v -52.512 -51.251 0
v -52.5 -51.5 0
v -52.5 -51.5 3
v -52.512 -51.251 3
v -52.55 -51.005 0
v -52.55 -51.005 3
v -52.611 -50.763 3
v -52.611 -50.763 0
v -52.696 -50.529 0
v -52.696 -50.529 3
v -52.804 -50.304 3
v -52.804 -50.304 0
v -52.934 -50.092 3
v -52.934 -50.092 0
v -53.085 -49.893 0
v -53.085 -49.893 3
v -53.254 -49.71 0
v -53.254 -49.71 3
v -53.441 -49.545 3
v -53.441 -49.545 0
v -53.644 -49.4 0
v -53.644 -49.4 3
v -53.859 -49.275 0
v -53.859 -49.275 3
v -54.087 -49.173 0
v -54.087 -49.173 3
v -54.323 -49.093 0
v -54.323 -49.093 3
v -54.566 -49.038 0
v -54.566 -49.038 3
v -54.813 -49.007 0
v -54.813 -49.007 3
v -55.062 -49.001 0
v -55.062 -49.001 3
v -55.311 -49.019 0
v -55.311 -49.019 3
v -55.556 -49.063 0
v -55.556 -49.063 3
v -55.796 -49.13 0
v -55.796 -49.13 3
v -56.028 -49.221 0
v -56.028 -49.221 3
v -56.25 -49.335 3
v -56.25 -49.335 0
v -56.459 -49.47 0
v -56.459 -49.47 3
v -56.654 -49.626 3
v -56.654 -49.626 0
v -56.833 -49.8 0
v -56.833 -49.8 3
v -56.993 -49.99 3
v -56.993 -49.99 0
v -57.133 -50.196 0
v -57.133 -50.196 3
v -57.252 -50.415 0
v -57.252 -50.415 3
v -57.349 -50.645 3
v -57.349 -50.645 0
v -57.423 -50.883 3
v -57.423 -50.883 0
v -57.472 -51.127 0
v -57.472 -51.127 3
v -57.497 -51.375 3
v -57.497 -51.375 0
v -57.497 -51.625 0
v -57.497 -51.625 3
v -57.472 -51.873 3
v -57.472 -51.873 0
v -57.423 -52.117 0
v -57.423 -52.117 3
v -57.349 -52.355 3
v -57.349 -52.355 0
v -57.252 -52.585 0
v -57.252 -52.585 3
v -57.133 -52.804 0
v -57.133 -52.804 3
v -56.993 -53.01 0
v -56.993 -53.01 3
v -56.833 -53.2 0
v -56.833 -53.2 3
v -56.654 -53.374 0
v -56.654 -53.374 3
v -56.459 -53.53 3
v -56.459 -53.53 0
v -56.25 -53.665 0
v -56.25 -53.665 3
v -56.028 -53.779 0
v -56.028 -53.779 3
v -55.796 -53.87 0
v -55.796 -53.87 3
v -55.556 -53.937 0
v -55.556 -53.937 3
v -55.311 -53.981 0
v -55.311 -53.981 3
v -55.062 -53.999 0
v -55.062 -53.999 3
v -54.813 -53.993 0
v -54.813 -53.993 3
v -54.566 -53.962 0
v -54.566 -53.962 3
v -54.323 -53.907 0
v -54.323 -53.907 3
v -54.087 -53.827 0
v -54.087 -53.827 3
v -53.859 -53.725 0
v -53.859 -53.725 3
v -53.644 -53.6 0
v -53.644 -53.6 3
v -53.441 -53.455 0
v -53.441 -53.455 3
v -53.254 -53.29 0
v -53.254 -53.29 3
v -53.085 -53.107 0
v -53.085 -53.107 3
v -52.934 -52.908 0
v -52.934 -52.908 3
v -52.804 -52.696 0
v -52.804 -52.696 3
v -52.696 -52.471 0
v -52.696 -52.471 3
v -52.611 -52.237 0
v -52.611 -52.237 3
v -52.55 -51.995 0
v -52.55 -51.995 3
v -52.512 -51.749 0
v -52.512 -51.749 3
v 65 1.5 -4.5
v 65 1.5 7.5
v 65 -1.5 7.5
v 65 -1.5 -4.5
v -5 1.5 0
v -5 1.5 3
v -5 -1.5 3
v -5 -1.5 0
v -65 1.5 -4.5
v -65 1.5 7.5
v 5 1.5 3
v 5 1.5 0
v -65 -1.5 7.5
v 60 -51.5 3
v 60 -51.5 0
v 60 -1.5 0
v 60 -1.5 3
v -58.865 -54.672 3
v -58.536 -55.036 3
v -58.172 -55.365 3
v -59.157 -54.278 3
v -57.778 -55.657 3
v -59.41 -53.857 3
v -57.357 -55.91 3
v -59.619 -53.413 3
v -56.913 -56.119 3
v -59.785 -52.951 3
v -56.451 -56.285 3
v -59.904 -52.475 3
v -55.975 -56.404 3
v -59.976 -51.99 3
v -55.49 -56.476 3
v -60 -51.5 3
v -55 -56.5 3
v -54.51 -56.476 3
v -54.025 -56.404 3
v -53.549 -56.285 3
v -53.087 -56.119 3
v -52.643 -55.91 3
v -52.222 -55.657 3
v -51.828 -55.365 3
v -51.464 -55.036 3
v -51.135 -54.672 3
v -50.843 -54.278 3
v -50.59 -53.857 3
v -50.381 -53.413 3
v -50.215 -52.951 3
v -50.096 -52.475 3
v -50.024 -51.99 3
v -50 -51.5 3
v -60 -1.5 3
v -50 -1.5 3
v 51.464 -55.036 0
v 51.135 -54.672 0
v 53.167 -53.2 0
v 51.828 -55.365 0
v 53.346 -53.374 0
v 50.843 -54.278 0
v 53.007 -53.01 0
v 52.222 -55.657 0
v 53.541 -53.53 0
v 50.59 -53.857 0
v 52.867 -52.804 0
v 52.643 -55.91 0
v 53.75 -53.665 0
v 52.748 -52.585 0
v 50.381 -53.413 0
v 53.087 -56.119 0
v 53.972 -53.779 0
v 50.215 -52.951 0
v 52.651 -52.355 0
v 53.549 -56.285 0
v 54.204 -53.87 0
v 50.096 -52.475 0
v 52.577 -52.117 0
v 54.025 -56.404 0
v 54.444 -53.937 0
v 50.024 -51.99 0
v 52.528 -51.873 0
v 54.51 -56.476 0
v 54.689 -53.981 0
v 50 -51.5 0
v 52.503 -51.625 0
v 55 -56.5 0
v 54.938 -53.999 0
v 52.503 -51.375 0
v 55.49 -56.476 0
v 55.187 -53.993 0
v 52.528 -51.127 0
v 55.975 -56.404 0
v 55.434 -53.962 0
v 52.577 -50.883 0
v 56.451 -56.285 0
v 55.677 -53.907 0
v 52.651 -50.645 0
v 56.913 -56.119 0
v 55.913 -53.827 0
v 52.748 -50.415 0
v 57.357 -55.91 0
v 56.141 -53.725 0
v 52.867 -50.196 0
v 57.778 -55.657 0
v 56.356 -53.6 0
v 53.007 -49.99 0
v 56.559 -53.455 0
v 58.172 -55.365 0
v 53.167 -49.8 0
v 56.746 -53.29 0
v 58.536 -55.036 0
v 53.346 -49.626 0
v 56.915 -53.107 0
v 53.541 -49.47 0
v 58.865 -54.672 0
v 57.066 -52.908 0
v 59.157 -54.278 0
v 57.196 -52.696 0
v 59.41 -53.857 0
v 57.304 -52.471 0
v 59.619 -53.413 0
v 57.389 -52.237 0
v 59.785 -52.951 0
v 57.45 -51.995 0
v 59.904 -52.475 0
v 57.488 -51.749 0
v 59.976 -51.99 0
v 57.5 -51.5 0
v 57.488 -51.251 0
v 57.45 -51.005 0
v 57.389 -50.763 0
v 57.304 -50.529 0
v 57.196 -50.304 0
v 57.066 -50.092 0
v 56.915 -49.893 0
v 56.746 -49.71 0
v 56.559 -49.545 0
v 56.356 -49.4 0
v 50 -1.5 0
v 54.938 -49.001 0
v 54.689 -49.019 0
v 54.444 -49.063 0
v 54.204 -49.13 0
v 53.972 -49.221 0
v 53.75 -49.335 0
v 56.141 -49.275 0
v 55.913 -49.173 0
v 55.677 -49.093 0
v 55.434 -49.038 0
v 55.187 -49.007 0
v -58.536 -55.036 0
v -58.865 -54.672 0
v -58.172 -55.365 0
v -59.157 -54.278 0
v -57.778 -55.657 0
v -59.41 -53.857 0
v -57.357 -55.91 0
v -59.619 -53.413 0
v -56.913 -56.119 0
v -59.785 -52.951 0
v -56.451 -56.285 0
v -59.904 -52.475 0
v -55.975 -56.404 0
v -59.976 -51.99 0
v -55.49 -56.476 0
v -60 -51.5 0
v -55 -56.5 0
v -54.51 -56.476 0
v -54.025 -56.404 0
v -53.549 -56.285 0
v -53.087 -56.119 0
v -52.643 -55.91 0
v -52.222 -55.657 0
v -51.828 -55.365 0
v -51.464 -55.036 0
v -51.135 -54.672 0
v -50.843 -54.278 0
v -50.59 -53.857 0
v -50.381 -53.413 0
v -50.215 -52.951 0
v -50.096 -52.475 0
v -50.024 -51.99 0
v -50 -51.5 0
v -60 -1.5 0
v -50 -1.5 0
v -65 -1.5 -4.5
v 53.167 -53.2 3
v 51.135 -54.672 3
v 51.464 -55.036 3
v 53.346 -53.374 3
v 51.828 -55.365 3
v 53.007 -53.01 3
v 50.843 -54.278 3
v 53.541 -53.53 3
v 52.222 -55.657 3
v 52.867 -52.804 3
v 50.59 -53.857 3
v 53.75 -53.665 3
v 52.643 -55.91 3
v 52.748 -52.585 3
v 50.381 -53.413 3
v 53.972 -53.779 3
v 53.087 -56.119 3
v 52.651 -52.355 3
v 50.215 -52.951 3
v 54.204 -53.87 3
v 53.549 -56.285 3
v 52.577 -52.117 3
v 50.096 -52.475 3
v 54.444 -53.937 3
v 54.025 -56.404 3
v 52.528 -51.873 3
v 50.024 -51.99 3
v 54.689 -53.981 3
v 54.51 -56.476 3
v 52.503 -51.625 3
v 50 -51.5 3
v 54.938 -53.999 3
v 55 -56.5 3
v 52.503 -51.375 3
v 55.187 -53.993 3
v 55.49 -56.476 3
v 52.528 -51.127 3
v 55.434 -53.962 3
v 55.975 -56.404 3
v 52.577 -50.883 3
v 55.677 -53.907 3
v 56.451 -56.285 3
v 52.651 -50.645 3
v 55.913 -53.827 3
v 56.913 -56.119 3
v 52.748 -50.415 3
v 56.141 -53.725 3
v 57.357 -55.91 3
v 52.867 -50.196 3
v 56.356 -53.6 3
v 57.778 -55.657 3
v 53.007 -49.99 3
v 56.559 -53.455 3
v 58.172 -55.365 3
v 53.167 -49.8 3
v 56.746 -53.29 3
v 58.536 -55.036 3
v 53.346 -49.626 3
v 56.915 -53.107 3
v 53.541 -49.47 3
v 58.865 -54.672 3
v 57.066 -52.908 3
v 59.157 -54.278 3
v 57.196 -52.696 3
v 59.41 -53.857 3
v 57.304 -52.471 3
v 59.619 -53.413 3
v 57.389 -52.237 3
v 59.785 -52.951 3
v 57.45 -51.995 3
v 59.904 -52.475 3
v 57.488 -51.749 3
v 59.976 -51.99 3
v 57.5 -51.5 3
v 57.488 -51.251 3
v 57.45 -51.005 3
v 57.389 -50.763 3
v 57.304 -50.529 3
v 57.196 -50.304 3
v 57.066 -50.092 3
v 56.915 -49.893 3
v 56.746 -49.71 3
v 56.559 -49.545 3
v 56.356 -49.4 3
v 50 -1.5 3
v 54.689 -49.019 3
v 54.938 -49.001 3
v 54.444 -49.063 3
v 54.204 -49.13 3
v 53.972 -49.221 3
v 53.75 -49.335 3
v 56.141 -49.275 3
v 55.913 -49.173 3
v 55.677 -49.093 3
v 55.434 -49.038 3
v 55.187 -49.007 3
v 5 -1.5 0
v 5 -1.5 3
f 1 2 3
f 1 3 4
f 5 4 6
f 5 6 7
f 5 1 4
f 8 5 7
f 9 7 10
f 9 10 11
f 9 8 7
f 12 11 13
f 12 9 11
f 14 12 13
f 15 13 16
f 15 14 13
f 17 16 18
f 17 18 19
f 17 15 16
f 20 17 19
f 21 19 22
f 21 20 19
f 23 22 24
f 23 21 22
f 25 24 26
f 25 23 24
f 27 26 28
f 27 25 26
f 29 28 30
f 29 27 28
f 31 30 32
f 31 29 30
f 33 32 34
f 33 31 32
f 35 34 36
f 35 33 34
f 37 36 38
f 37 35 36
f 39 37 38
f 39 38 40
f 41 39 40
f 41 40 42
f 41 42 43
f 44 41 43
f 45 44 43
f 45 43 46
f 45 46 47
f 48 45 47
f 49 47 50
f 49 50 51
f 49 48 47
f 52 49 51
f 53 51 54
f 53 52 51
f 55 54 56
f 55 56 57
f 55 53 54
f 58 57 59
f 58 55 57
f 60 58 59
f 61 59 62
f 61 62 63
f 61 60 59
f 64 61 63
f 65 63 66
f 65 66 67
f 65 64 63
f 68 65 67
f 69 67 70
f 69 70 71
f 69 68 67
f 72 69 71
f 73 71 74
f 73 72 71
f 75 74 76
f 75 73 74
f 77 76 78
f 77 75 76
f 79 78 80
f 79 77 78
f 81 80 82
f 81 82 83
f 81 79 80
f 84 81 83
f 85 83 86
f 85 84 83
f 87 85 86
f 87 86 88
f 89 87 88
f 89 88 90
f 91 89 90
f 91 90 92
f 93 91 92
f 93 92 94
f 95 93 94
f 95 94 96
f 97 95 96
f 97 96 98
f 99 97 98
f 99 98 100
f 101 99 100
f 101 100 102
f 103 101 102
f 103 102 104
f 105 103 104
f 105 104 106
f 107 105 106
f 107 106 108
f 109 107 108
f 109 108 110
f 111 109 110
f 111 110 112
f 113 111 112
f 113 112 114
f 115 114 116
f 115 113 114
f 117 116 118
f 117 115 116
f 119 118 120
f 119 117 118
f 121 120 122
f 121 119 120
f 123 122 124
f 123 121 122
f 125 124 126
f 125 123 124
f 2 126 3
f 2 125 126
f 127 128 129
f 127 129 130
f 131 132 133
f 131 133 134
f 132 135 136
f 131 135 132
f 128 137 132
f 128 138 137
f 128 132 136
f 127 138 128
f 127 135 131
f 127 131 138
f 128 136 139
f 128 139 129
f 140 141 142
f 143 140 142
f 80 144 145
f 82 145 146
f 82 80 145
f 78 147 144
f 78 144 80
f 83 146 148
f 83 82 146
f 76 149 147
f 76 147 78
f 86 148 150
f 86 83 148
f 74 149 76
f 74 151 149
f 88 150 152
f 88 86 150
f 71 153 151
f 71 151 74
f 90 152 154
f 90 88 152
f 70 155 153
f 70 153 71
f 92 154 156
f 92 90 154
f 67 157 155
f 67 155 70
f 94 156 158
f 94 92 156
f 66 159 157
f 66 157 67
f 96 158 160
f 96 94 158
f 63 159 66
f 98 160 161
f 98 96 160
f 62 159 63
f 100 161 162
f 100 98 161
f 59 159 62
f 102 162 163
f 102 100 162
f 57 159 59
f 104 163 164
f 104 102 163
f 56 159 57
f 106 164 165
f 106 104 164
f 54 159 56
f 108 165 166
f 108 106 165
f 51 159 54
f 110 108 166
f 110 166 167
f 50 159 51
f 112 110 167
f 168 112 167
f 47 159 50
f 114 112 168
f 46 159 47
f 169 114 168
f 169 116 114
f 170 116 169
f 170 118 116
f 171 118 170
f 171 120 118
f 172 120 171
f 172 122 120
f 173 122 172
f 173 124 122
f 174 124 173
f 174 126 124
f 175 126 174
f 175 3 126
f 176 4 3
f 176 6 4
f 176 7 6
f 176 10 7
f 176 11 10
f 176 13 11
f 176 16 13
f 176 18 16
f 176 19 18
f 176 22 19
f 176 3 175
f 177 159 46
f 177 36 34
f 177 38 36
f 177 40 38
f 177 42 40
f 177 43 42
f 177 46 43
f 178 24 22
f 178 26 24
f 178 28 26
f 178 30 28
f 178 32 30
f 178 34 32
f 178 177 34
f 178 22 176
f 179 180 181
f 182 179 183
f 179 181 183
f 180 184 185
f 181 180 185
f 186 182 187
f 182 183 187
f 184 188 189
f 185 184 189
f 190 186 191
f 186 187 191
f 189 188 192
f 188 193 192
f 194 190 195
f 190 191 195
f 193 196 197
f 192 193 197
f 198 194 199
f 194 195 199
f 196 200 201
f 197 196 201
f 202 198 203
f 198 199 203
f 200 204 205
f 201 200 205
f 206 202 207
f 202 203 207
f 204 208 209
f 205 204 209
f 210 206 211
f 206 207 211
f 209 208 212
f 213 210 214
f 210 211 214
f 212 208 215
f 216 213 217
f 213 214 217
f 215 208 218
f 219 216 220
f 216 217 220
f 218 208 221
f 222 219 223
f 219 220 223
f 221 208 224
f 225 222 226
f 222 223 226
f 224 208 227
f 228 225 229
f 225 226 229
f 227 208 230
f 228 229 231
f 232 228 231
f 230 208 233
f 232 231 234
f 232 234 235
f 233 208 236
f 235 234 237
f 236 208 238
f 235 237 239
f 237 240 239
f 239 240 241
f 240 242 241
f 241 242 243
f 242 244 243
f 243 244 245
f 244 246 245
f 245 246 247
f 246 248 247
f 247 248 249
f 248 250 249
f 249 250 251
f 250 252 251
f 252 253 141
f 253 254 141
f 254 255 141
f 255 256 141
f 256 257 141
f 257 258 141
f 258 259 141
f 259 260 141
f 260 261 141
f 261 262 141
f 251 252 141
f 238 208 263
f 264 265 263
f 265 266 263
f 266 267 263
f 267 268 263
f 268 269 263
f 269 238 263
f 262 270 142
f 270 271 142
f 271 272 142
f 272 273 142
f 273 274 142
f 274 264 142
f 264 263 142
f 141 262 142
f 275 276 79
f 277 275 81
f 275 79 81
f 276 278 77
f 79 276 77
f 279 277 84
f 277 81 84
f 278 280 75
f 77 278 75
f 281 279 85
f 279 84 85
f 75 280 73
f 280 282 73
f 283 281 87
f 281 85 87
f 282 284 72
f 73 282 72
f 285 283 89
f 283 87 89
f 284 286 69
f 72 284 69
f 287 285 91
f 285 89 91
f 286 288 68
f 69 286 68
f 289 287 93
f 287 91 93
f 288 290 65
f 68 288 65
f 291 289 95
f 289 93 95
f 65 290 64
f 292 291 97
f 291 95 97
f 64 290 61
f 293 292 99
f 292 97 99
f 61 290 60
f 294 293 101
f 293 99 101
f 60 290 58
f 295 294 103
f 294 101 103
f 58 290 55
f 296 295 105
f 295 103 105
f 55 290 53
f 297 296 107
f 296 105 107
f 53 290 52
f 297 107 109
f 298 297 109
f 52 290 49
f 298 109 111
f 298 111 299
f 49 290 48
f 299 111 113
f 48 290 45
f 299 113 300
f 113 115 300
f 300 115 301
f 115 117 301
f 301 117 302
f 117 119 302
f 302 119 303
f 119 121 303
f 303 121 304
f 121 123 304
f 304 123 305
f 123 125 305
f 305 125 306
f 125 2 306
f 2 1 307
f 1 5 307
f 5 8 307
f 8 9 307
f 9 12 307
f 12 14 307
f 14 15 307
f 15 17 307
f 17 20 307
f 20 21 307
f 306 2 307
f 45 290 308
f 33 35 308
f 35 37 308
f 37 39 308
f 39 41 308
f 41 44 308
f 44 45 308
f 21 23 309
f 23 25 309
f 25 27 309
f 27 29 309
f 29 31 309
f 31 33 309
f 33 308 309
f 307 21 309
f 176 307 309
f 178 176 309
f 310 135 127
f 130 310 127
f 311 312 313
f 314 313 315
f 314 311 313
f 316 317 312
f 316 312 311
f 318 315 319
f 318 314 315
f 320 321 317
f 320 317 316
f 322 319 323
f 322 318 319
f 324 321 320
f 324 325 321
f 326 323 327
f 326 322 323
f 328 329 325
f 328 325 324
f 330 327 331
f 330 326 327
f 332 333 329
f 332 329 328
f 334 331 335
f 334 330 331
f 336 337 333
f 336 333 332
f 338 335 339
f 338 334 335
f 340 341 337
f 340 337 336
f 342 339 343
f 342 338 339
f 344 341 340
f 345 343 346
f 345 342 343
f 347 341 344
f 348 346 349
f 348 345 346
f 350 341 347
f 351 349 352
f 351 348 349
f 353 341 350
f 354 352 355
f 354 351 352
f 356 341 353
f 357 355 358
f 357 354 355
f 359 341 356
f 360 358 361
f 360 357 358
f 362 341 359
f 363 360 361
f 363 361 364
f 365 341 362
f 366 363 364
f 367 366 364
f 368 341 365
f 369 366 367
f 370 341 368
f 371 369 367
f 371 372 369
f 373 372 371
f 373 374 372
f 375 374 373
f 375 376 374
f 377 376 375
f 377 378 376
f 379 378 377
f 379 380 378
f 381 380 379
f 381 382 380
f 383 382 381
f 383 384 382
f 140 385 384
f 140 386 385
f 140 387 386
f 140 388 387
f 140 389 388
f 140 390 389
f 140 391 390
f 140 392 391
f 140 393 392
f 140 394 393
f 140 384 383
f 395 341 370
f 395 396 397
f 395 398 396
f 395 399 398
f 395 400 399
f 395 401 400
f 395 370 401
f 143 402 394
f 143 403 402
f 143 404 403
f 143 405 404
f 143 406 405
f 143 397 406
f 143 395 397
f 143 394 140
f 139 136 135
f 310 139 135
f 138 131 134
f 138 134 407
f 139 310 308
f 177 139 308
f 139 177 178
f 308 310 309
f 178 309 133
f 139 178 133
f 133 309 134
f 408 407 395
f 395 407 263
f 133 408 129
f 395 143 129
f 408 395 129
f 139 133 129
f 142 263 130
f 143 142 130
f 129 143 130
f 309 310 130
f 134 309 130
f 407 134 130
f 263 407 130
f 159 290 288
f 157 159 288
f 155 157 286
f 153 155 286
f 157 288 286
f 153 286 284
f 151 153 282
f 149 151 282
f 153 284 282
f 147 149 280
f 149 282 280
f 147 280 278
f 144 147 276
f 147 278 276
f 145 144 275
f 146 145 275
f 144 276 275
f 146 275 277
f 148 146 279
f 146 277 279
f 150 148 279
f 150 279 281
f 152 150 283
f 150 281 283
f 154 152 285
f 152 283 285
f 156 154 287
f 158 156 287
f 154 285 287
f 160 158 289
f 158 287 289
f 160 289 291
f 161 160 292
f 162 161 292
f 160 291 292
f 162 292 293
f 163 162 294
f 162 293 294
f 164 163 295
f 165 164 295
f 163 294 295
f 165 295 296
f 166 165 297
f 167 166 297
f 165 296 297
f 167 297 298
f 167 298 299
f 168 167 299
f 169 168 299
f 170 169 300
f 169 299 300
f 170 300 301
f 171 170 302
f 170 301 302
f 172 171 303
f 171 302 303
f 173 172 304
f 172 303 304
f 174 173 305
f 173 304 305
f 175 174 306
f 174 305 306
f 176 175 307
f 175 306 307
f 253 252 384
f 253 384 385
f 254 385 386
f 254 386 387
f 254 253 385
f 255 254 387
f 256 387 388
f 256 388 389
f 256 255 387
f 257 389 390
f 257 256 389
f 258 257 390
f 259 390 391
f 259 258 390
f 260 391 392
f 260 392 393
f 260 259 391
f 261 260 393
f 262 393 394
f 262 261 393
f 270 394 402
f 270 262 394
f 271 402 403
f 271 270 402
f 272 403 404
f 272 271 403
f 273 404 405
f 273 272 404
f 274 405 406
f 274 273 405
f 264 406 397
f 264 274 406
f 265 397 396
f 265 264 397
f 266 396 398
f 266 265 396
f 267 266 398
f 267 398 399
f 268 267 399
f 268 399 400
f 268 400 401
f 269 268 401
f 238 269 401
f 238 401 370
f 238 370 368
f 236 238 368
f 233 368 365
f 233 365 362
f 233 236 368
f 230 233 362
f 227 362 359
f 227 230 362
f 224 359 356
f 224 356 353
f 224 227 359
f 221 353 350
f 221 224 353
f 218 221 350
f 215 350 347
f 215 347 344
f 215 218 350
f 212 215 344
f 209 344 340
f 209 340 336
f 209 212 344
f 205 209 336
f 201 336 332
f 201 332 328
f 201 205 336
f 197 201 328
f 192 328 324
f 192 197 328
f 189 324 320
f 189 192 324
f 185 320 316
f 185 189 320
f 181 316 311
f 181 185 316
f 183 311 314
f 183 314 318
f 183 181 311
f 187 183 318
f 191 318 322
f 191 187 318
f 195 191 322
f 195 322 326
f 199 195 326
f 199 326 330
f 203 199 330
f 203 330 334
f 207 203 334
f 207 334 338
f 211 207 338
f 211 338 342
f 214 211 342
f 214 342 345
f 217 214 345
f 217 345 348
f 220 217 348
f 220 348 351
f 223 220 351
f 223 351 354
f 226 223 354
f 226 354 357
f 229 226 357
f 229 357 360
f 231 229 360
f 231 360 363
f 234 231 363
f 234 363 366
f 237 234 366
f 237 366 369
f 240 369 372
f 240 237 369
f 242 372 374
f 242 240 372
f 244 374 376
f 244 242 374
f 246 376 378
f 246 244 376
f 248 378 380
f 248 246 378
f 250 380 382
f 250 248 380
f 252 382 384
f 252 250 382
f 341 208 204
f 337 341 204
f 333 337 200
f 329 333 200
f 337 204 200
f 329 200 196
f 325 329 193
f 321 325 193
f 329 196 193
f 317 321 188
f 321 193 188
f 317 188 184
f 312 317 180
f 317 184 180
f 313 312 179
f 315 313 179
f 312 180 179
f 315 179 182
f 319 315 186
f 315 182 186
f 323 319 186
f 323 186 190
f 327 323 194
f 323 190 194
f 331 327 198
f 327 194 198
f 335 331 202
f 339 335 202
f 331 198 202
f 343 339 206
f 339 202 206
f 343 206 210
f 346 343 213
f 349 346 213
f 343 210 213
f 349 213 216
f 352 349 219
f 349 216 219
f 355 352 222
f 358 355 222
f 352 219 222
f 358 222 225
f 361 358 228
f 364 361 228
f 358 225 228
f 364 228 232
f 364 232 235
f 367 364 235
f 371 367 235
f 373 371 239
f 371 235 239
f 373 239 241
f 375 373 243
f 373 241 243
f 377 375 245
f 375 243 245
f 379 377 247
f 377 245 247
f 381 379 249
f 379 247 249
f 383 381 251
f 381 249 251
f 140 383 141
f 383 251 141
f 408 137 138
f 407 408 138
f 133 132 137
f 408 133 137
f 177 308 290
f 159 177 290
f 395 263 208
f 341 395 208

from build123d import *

# Parameters (mm, degrees)
SKETCH1_R           = 2.5
BOSS_EXTRUDE1_DEPTH = 3
SKETCH2_W           = 130
SKETCH2_H           = 12
BOSS_EXTRUDE2_DEPTH = 3
SKETCH3_W           = 10
SKETCH3_H           = 3
CUT_EXTRUDE1_DEPTH  = 3


with BuildPart() as part:
    # Sketch1 → Boss-Extrude1 (new body)
    with BuildSketch(Plane.XY):
        with BuildLine():
            Line((-50, -51.5), (-50, -1.5))
            Line((-50, -1.5), (50, -1.5))
            Line((50, -1.5), (50, -51.5))
            ThreePointArc((50, -51.5), (55, -56.5), (60, -51.5))
            Line((60, -51.5), (60, -1.5))
            Line((60, -1.5), (65, -1.5))
            Line((65, -1.5), (65, 1.5))
            Line((65, 1.5), (-65, 1.5))
            Line((-65, 1.5), (-65, -1.5))
            Line((-65, -1.5), (-60, -1.5))
            Line((-60, -1.5), (-60, -51.5))
            ThreePointArc((-60, -51.5), (-55, -56.5), (-50, -51.5))
        make_face()
        with Locations((-55, -51.5)):
            Circle(SKETCH1_R, mode=Mode.SUBTRACT)
        with Locations((55, -51.5)):
            Circle(SKETCH1_R, mode=Mode.SUBTRACT)
    extrude(amount=BOSS_EXTRUDE1_DEPTH)

    # Sketch2 → Boss-Extrude2 (add)
    with BuildSketch(Plane(origin=(0, 1.5, 0), x_dir=(1, 0, 0), z_dir=(0, 1, 0))):
        with Locations((0, -1.5)):
            Rectangle(SKETCH2_W, SKETCH2_H)
    extrude(amount=-BOSS_EXTRUDE2_DEPTH)

    # Sketch3 → Cut-Extrude1 (cut)
    with BuildSketch(Plane(origin=(0, 1.5, 0), x_dir=(1, 0, 0), z_dir=(0, 1, 0))):
        with Locations((0, -1.5)):
            Rectangle(SKETCH3_W, SKETCH3_H)
    extrude(amount=-CUT_EXTRUDE1_DEPTH, mode=Mode.SUBTRACT)


solid = part.part
